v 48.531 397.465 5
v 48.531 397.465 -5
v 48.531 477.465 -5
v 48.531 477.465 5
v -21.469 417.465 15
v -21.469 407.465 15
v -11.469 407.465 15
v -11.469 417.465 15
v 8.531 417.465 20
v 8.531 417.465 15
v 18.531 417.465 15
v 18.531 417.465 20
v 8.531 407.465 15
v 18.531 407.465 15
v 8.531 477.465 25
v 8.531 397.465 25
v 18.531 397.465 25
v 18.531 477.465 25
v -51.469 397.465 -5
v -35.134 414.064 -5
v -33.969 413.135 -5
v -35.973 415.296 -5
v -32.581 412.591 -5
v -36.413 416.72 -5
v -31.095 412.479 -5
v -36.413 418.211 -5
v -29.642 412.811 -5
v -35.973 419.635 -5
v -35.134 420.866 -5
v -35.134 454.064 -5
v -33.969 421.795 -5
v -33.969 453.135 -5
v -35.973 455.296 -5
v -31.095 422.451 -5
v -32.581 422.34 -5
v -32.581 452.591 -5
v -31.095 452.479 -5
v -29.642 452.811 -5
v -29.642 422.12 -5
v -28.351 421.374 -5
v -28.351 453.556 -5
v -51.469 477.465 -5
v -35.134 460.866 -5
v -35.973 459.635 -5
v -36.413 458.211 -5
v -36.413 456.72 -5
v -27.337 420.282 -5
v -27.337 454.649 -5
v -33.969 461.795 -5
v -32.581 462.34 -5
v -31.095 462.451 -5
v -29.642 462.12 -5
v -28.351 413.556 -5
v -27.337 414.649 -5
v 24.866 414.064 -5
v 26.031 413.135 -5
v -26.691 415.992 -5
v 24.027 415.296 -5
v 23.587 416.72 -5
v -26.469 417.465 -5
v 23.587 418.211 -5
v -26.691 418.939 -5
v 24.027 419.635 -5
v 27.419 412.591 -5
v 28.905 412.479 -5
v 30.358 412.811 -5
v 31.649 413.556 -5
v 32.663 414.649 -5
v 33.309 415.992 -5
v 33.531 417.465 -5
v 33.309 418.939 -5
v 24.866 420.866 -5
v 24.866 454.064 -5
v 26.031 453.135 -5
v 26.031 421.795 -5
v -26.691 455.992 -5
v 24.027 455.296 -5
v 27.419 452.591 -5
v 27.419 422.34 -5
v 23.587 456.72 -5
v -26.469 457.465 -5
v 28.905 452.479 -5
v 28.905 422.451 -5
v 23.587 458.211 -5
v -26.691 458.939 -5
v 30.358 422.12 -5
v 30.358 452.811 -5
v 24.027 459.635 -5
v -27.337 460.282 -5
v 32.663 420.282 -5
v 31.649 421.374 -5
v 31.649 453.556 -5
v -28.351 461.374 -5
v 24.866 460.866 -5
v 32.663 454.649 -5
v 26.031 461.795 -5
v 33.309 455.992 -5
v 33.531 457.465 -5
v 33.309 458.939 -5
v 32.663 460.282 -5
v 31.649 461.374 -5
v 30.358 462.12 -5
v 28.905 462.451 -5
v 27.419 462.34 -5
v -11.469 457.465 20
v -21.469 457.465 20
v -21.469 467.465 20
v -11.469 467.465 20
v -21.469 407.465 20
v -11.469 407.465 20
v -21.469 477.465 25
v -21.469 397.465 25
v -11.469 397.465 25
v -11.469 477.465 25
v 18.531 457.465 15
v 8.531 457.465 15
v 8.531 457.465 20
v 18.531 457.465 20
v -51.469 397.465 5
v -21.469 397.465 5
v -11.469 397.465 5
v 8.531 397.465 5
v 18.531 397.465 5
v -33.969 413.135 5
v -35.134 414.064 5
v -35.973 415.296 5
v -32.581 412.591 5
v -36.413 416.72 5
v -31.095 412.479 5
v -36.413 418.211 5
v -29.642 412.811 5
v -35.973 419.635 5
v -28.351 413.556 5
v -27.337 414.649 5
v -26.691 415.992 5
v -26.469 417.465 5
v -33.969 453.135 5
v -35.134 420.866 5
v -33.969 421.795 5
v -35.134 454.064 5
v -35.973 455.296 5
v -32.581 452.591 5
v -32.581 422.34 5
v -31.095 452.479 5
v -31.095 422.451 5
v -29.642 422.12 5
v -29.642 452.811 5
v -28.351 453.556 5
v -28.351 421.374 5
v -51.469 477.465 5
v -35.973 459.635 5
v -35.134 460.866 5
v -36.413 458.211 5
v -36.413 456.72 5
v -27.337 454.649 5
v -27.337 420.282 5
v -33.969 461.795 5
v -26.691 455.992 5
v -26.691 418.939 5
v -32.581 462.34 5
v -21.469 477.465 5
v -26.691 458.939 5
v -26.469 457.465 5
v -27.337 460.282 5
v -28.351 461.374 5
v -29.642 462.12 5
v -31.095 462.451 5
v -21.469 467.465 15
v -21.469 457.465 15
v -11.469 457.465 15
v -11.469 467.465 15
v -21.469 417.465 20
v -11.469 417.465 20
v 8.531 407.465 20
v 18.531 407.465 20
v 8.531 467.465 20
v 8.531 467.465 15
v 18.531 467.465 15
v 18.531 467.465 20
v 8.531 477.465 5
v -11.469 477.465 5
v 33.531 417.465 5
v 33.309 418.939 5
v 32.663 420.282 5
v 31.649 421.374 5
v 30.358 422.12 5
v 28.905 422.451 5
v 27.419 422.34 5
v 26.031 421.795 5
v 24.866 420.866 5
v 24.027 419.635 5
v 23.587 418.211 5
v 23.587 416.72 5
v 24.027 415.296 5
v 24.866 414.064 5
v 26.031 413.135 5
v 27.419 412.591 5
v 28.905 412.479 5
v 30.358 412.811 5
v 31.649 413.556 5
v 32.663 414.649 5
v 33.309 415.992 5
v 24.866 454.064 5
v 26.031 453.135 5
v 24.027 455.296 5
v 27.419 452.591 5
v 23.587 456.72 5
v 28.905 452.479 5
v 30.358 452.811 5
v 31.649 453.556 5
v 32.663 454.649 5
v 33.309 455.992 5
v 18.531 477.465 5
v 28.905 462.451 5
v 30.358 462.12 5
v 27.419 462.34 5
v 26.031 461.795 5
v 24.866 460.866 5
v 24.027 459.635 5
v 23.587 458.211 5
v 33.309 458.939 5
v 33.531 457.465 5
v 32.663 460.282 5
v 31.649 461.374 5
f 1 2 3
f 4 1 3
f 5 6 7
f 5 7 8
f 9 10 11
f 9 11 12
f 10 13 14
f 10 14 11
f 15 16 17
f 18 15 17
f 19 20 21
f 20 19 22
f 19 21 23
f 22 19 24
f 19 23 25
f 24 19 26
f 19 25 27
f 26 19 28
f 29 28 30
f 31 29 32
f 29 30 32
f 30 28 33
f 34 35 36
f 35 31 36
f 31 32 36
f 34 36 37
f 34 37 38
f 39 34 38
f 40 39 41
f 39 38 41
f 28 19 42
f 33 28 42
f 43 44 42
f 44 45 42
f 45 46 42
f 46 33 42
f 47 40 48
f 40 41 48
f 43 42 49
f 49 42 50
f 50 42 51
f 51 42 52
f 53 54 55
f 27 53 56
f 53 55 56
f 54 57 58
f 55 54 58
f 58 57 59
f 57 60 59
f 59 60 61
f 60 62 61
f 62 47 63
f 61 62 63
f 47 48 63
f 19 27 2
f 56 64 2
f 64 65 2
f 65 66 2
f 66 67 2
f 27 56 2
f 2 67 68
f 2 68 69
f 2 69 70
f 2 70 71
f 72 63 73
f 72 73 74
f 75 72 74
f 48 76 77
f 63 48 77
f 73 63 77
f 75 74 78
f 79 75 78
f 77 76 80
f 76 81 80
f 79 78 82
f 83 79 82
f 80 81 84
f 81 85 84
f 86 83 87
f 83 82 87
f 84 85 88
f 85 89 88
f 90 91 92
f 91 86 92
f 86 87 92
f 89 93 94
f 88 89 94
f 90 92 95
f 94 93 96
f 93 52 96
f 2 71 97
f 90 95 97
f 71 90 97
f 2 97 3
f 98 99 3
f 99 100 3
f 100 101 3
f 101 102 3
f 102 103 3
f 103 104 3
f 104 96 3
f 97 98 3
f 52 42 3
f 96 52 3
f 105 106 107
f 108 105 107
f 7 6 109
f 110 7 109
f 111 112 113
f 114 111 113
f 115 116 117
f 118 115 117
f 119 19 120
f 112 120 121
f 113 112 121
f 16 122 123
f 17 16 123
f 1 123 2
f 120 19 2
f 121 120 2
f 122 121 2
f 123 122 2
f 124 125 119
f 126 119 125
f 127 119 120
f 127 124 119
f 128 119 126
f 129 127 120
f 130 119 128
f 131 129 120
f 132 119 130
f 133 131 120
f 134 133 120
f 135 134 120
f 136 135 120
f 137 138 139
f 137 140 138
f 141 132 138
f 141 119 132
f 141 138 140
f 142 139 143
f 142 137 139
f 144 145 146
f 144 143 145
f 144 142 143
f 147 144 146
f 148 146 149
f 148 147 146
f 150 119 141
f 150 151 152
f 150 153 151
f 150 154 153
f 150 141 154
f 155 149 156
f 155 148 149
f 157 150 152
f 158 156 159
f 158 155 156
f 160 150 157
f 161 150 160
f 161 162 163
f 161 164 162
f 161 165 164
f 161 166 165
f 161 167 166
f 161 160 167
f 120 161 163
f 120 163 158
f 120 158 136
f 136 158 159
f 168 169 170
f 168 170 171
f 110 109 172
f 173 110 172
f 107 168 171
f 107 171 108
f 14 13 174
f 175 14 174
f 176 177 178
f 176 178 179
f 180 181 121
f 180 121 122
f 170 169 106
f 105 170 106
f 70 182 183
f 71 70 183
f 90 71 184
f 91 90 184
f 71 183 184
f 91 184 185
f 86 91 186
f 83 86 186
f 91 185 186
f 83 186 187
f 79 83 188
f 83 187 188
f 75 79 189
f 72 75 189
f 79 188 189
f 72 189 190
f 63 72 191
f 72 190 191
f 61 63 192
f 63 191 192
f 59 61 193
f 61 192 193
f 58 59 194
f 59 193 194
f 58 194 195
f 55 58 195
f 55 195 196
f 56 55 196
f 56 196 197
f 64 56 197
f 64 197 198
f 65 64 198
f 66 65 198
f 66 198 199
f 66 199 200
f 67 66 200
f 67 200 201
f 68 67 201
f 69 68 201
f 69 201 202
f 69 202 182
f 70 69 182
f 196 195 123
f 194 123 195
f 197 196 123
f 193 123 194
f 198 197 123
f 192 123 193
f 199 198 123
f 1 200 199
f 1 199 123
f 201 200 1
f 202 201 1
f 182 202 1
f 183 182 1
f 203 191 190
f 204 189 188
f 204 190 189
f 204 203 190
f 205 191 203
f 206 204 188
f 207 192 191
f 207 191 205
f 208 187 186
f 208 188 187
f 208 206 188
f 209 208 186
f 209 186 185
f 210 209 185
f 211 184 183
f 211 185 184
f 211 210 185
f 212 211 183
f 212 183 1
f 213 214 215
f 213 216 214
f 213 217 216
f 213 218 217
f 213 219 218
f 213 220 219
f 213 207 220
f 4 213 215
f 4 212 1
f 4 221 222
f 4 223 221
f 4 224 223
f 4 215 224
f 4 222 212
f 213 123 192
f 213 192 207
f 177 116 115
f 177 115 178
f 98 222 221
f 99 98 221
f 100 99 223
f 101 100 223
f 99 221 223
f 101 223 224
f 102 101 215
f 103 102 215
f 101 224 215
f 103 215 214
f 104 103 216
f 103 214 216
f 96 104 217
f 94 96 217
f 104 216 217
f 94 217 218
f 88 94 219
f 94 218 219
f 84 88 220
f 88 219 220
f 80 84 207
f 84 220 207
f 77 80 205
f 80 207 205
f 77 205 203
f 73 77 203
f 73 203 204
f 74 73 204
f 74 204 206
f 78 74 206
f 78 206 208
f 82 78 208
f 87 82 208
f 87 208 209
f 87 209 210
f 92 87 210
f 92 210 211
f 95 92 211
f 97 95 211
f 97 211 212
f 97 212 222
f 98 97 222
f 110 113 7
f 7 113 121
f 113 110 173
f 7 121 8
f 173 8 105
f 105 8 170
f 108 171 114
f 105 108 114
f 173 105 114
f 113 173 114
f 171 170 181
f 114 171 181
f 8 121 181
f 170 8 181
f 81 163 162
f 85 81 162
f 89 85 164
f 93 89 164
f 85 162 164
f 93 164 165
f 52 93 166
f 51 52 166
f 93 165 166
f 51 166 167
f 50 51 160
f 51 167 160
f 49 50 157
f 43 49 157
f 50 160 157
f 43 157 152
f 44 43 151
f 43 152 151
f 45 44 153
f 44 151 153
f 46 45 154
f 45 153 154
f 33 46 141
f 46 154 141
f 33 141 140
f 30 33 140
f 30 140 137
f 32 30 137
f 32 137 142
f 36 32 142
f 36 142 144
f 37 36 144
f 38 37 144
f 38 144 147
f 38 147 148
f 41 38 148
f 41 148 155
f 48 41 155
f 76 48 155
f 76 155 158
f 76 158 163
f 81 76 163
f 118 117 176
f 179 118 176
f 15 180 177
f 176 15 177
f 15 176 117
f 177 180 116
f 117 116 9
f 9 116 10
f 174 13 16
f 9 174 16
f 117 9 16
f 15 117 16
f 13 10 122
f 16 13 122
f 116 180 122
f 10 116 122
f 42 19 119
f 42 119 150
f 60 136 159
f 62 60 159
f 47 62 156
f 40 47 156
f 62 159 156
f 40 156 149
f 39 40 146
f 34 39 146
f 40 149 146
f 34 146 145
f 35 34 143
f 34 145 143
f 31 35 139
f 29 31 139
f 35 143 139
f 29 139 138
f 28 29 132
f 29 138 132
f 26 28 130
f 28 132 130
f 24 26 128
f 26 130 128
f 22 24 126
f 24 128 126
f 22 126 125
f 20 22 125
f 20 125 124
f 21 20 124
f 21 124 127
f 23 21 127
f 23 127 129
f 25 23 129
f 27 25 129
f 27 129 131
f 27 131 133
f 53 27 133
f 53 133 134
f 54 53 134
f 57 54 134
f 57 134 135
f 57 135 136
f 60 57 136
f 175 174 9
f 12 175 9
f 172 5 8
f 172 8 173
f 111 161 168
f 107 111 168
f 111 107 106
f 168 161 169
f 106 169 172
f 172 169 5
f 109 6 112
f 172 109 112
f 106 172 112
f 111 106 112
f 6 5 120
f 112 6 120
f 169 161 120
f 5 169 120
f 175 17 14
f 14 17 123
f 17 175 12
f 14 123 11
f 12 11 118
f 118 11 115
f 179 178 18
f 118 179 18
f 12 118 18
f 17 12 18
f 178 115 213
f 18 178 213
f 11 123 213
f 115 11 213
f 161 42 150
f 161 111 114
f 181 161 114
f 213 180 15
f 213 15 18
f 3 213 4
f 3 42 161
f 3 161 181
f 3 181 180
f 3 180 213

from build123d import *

# Parameters (mm, degrees)
SKETCH1_W           = 50
SKETCH1_H           = 40
BOSS_EXTRUDE1_DEPTH = 10
SKETCH5_W           = 6
SKETCH5_H           = 5
BOSS_EXTRUDE3_DEPTH = 10
SKETCH6_R           = 1.25
CUT_EXTRUDE1_DEPTH  = 20
SKETCH8_W           = 10
SKETCH8_H           = 40
CUT_EXTRUDE2_DEPTH  = 25
SKETCH12_W          = 5
SKETCH12_H          = 5
BOSS_EXTRUDE5_DEPTH = 10
SKETCH13_R          = 1.25
CUT_EXTRUDE4_DEPTH  = 10
SKETCH14_R          = 2.5
CUT_EXTRUDE5_DEPTH  = 10
CUT_EXTRUDE6_DEPTH  = 22
CUT_EXTRUDE7_DEPTH  = 30
CUT_EXTRUDE8_DEPTH  = 30
SCALE1_SCALE        = 2
SKETCH19_W          = 172.616714004
SKETCH19_H          = 129.336721571
SKETCH19_W_2        = 100
SKETCH19_H_2        = 80
CUT_EXTRUDE9_DEPTH  = 20
SKETCH20_W          = 100
SKETCH20_H          = 80
CUT_EXTRUDE10_DEPTH = 10
BOSS_EXTRUDE6_DEPTH = 20
SKETCH22_W          = 5
SKETCH22_H          = 10
CUT_EXTRUDE11_DEPTH = 50


with BuildPart() as part:
    # Sketch1 → Boss-Extrude1 (new body)
    with BuildSketch(Plane(origin=(669.84184187, 0, 0), x_dir=(1, 0, 0), z_dir=(0, 0, 1))):
        with Locations((-671.310344828, 437.637931034)):
            Rectangle(SKETCH1_W, SKETCH1_H)
    boss_extrude1 = extrude(amount=BOSS_EXTRUDE1_DEPTH)

    # Sketch5 → Boss-Extrude3 (add)
    with BuildSketch(Plane(origin=(23.531497042, 0, 0), x_dir=(0, 0, -1), z_dir=(1, 0, 0))):
        with Locations((-5, 442.637931034)):
            Rectangle(SKETCH5_W, SKETCH5_H)
        with Locations((-5, 432.637931034)):
            Rectangle(SKETCH5_W, SKETCH5_H)
    boss_extrude3 = extrude(amount=BOSS_EXTRUDE3_DEPTH)

    # Sketch6 → Cut-Extrude1 (cut)
    with BuildSketch(Plane(origin=(669.84184187, 445.137931034, 0), x_dir=(1, 0, 0), z_dir=(0, 1, 0))):
        with Locations(Location((-641.310344828, -5, 0), (0, 0, 180))):
            Circle(SKETCH6_R)
    cut_extrude1 = extrude(amount=-CUT_EXTRUDE1_DEPTH, mode=Mode.SUBTRACT)

    # Sketch8 → Cut-Extrude2 (cut)
    with BuildSketch(Plane.ZY.offset(26.468502958)):
        with Locations((5, 437.637931034)):
            Rectangle(SKETCH8_W, SKETCH8_H)
    extrude(amount=-CUT_EXTRUDE2_DEPTH, mode=Mode.SUBTRACT)

    # Mirror1: Boss-Extrude1, Boss-Extrude3, Cut-Extrude1 across plane
    add(boss_extrude1.mirror(Plane(origin=(-1.468502958, 0, 0), x_dir=(0, 0, 1), z_dir=(1, 0, 0))))
    add(boss_extrude3.mirror(Plane(origin=(-1.468502958, 0, 0), x_dir=(0, 0, 1), z_dir=(1, 0, 0))))
    add(cut_extrude1.mirror(Plane(origin=(-1.468502958, 0, 0), x_dir=(0, 0, 1), z_dir=(1, 0, 0))), mode=Mode.SUBTRACT)

    # Sketch12 → Boss-Extrude5 (add)
    with BuildSketch(Plane(origin=(0, 457.637931034, 0), x_dir=(1, 0, 0), z_dir=(0, 1, 0))):
        with Locations((-1.468502958, -5)):
            Rectangle(SKETCH12_W, SKETCH12_H)
    extrude(amount=BOSS_EXTRUDE5_DEPTH)

    # Sketch13 → Cut-Extrude4 (cut)
    with BuildSketch(Plane(origin=(1.031497042, 0, 0), x_dir=(0, 0, -1), z_dir=(1, 0, 0))):
        with Locations((-5, 462.637931034)):
            Circle(SKETCH13_R)
    extrude(amount=-CUT_EXTRUDE4_DEPTH, mode=Mode.SUBTRACT)

    # Sketch14 → Cut-Extrude5 (cut)
    with BuildSketch(Plane.XY.offset(10)):
        with Locations((-16.468502958, 447.637931034)):
            Circle(SKETCH14_R)
        with Locations((-16.468502958, 427.637931034)):
            Circle(SKETCH14_R)
        with Locations((13.531497042, 447.637931034)):
            Circle(SKETCH14_R)
        with Locations((13.531497042, 427.637931034)):
            Circle(SKETCH14_R)
    extrude(amount=-CUT_EXTRUDE5_DEPTH, mode=Mode.SUBTRACT)

    # Sketch15 → Cut-Extrude6 (cut)
    with BuildSketch(Plane(origin=(0, 445.137931034, 0), x_dir=(1, 0, 0), z_dir=(0, 1, 0))):
        with BuildLine():
            Line((33.531497042, -2), (28.531497042, -2))
            ThreePointArc((28.531497042, -2), (30.652817386, -2.878679656), (31.531497042, -5))
            ThreePointArc((31.531497042, -5), (30.652817386, -7.121320344), (28.531497042, -8))
            Line((28.531497042, -8), (33.531497042, -8))
            Line((33.531497042, -8), (33.531497042, -2))
        make_face()
    extrude(amount=-CUT_EXTRUDE6_DEPTH, mode=Mode.SUBTRACT)

    # Sketch17 → Cut-Extrude7 (cut)
    with BuildSketch(Plane(origin=(0, 445.137931034, 0), x_dir=(1, 0, 0), z_dir=(0, 1, 0))):
        with BuildLine():
            Line((-36.468502958, -8), (-31.468502958, -8))
            ThreePointArc((-31.468502958, -8), (-34.468502958, -5), (-31.468502958, -2))
            Line((-31.468502958, -2), (-36.468502958, -2))
            Line((-36.468502958, -2), (-36.468502958, -8))
        make_face()
    extrude(amount=-CUT_EXTRUDE7_DEPTH, mode=Mode.SUBTRACT)

    # Sketch18 → Cut-Extrude8 (cut)
    with BuildSketch(Plane(origin=(1.031497042, 0, 0), x_dir=(0, 0, -1), z_dir=(1, 0, 0))):
        with BuildLine():
            Line((-7.5, 467.637931034), (-7.5, 462.637931034))
            ThreePointArc((-7.5, 462.637931034), (-5, 465.137931034), (-2.5, 462.637931034))
            Line((-2.5, 462.637931034), (-2.5, 467.637931034))
            Line((-2.5, 467.637931034), (-7.5, 467.637931034))
        make_face()
    extrude(amount=-CUT_EXTRUDE8_DEPTH, mode=Mode.SUBTRACT)


with BuildPart() as part_1:
    # Scale1: scaled about (-1.468502958, 437.810556227, 5)
    add(part.part.scale(SCALE1_SCALE).moved(Location((1.468502958, -437.810556227, -5))))

    # Sketch19 → Cut-Extrude9 (cut)
    with BuildSketch(Plane.XY.offset(15)):
        with Locations((2.170441993, 437.623617036)):
            Rectangle(SKETCH19_W, SKETCH19_H)
        with Locations((-1.468502958, 437.465305842)):
            Rectangle(SKETCH19_W_2, SKETCH19_H_2, mode=Mode.SUBTRACT)
    extrude(amount=-CUT_EXTRUDE9_DEPTH, mode=Mode.SUBTRACT)

    # Sketch20 → Cut-Extrude10 (cut)
    with BuildSketch(Plane.XY.offset(15)):
        with Locations((-1.468502958, 437.465305842)):
            Rectangle(SKETCH20_W, SKETCH20_H)
    extrude(amount=-CUT_EXTRUDE10_DEPTH, mode=Mode.SUBTRACT)

    # Sketch21 → Boss-Extrude6 (add)
    with BuildSketch(Plane.XY.offset(5)):
        Polygon((-11.468502958, 477.465305842), (-21.468502958, 477.465305842), (-21.468502958, 397.465305842), (-11.468502958, 397.465305842), (-11.468502958, 464.619479755), align=None)
        Polygon((18.531497042, 477.465305842), (8.531497042, 477.465305842), (8.531497042, 471.588870089), (8.531497042, 397.465305842), (18.531497042, 397.465305842), align=None)
    extrude(amount=BOSS_EXTRUDE6_DEPTH)

    # Sketch22 → Cut-Extrude11 (cut)
    with BuildSketch(Plane.ZY.offset(21.468502958)):
        with Locations((17.5, 462.465305842)):
            Rectangle(SKETCH22_W, SKETCH22_H)
        with Locations((17.5, 412.465305842)):
            Rectangle(SKETCH22_W, SKETCH22_H)
    extrude(amount=-CUT_EXTRUDE11_DEPTH, mode=Mode.SUBTRACT)


solid = part_1.part
